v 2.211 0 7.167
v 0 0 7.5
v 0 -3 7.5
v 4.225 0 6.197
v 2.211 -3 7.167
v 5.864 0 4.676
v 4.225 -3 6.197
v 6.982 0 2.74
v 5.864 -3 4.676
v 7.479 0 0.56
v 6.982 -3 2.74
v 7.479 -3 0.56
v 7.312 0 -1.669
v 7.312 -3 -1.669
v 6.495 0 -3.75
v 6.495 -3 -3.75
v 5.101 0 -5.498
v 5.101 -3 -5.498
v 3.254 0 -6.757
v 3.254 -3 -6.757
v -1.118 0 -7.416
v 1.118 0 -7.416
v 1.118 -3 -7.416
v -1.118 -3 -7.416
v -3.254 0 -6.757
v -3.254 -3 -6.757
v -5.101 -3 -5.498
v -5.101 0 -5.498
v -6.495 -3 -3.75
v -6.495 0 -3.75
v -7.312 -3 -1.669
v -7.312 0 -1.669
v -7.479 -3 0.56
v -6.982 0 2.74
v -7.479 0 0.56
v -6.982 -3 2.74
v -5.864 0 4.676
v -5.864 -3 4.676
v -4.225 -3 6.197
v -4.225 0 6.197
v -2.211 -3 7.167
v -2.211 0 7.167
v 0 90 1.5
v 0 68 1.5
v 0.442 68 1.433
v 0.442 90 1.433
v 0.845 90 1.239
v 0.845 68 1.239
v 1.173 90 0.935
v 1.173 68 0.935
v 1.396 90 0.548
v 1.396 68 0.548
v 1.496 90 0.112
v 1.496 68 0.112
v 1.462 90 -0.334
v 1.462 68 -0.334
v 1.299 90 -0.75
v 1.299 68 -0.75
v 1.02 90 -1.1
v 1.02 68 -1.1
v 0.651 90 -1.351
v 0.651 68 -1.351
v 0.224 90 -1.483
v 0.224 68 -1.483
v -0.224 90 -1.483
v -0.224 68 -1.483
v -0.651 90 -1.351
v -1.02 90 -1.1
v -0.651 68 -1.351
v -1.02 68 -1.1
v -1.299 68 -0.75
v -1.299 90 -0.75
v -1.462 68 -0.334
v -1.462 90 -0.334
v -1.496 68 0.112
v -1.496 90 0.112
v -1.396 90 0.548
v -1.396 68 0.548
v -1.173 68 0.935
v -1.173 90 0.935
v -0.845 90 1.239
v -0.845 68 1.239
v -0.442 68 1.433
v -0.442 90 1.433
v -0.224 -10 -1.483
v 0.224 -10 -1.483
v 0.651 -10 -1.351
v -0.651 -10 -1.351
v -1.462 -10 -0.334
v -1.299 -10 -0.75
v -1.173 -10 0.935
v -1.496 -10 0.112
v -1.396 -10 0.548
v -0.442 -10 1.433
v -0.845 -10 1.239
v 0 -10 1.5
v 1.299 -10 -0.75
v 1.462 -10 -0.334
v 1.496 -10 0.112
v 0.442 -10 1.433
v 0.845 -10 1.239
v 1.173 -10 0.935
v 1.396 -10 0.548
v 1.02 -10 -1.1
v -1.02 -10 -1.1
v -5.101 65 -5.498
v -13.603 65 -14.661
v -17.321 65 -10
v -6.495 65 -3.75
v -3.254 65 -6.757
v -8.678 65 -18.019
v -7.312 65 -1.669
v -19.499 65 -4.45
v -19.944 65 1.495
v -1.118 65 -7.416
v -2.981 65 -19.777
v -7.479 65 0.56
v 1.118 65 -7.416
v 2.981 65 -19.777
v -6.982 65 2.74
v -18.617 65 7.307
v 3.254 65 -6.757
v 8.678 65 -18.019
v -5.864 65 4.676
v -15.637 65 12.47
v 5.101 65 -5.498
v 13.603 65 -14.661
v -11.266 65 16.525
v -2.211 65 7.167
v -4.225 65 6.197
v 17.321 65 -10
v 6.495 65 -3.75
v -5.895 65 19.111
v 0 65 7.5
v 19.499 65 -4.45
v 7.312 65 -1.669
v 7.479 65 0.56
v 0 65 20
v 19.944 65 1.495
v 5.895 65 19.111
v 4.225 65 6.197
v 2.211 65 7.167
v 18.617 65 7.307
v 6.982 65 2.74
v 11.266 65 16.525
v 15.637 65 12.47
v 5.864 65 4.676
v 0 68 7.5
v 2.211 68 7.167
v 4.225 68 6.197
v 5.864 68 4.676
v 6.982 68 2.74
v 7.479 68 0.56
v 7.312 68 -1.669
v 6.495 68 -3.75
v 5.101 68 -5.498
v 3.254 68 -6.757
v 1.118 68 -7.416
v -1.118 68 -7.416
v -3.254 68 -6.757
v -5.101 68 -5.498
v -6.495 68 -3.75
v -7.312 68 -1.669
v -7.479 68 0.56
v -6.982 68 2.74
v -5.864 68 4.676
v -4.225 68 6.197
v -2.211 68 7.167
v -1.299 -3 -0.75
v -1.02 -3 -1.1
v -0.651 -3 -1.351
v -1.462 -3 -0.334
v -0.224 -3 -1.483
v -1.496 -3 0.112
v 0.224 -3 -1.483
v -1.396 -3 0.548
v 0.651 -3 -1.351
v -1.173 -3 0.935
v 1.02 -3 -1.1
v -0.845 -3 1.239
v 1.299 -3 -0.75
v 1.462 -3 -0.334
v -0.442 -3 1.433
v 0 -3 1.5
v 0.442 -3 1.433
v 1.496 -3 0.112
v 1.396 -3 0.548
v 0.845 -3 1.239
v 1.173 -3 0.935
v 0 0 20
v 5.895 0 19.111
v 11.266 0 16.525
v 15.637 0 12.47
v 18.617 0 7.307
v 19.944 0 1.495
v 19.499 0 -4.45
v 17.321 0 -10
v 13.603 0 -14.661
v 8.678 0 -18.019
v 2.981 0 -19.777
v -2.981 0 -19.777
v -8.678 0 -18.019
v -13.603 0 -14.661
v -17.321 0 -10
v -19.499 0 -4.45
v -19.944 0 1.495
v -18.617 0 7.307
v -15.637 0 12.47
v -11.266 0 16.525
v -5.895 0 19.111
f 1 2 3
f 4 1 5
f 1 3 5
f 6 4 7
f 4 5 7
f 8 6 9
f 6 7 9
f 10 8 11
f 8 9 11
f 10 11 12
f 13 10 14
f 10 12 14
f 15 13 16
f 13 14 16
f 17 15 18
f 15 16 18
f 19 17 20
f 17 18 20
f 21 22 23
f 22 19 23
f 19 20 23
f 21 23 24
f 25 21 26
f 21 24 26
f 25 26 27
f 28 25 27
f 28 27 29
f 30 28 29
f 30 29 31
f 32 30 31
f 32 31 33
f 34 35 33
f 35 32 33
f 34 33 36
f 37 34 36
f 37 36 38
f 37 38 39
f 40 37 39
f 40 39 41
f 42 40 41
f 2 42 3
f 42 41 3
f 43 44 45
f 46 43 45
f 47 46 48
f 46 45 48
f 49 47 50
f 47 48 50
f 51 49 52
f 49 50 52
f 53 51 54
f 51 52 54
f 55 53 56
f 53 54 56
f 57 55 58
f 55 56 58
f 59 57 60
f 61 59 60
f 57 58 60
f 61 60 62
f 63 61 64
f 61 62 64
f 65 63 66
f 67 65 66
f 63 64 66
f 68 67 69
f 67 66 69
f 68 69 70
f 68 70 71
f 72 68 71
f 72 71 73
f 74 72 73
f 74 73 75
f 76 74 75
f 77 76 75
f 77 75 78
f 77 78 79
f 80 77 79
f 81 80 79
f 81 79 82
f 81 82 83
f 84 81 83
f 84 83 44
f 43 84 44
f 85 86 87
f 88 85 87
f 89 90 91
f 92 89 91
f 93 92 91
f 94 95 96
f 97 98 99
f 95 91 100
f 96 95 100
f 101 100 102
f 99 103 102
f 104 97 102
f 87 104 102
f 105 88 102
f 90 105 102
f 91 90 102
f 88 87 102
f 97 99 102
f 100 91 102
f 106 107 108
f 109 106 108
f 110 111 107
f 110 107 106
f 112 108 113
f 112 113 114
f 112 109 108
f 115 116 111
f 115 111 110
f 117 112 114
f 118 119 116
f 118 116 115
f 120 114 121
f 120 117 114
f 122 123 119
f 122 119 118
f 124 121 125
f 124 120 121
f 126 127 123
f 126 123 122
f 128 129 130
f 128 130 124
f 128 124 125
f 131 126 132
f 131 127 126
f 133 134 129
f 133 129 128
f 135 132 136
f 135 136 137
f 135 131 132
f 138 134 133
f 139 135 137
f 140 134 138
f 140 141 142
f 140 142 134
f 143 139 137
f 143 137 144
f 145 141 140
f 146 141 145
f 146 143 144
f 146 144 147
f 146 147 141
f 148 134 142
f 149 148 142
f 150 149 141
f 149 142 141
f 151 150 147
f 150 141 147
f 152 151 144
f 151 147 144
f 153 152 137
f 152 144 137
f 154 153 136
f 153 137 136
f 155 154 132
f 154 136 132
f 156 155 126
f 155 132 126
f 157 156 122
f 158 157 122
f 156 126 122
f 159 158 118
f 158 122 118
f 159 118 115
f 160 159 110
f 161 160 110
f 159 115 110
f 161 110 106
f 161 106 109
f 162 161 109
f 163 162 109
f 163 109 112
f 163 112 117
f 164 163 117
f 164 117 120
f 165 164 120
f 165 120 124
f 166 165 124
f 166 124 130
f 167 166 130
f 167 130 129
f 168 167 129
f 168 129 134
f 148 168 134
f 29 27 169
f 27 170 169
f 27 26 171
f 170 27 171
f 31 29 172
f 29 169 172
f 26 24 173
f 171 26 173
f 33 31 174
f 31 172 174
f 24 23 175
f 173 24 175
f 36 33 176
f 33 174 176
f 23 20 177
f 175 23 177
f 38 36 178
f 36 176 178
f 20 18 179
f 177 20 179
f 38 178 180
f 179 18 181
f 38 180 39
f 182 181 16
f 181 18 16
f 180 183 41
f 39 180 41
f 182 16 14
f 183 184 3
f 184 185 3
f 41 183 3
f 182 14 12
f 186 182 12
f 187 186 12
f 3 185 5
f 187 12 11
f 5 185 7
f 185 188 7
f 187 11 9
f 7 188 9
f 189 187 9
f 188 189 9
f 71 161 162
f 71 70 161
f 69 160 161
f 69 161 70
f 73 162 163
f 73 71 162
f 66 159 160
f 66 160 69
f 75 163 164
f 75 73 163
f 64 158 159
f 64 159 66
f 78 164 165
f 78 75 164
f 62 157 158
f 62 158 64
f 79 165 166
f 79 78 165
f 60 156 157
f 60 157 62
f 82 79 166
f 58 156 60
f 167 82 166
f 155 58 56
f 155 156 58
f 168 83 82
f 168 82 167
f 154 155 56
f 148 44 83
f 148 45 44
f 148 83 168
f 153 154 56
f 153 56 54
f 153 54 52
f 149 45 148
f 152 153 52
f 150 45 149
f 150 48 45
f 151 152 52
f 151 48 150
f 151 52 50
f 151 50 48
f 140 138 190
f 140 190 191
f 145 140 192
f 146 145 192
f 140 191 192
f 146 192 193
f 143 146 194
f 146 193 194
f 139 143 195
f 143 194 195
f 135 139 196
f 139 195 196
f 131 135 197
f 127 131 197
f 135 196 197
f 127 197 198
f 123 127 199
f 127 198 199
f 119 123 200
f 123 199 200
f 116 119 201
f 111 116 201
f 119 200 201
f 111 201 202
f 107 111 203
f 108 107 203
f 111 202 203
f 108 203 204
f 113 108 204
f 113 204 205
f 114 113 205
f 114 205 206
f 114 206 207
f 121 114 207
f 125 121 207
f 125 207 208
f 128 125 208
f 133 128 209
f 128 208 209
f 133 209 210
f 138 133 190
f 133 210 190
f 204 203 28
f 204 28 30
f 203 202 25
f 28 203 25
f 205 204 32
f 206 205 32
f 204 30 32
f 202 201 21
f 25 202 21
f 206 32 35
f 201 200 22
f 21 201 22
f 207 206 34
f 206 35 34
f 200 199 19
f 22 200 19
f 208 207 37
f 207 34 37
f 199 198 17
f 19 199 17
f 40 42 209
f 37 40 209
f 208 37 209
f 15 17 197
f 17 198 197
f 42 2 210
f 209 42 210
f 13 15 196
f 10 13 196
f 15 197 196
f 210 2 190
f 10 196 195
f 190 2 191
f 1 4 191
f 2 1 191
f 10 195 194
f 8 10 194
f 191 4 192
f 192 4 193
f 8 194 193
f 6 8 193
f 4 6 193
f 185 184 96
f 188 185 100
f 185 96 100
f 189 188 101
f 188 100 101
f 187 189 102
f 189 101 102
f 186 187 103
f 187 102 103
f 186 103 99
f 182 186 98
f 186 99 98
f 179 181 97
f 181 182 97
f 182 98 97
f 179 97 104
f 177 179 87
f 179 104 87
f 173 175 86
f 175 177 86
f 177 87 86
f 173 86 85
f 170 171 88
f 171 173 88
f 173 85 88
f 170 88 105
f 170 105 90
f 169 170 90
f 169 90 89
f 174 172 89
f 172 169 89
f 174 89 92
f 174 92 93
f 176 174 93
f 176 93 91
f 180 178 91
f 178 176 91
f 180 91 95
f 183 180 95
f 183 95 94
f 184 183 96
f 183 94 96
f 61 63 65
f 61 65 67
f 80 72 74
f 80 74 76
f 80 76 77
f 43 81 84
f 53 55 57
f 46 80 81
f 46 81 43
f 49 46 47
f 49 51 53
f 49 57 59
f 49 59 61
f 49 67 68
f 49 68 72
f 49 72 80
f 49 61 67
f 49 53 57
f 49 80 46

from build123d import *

# Parameters (mm, degrees)
SKETCH1_R                = 20
BOSS_EXTRUDE1_DEPTH      = 65
BOSS_EXTRUDE2_DEPTH      = 3
BOSS_EXTRUDE2_DEPTH_BACK = 68
SKETCH2_R                = 7.5
BOSS_EXTRUDE3_DEPTH      = 90
BOSS_EXTRUDE3_DEPTH_BACK = 10
SKETCH3_R                = 1.5


with BuildPart() as part:
    # Sketch1 → Boss-Extrude1 (new body)
    with BuildSketch(Plane(origin=(0, 0, 0), x_dir=(1, 0, 0), z_dir=(0, 1, 0))):
        with Locations(Location((0, 0, 0), (0, 0, 270))):
            Circle(SKETCH1_R)
    extrude(amount=BOSS_EXTRUDE1_DEPTH)

    # Sketch2 → Boss-Extrude2 (add, two sides: drawn at the far end of the back side and taken through both)
    with BuildSketch(Plane(origin=(0, 65, 0), x_dir=(1, 0, 0), z_dir=(0, 1, 0)).offset(-BOSS_EXTRUDE2_DEPTH_BACK)):
        with Locations(Location((0, 0, 0), (0, 0, 270))):
            Circle(SKETCH2_R)
    extrude(amount=BOSS_EXTRUDE2_DEPTH + BOSS_EXTRUDE2_DEPTH_BACK)

    # Sketch3 → Boss-Extrude3 (add, two sides: drawn at the far end of the back side and taken through both)
    with BuildSketch(Plane(origin=(0, 0, 0), x_dir=(1, 0, 0), z_dir=(0, 1, 0)).offset(-BOSS_EXTRUDE3_DEPTH_BACK)):
        with Locations(Location((0, 0, 0), (0, 0, 270))):
            Circle(SKETCH3_R)
    extrude(amount=BOSS_EXTRUDE3_DEPTH + BOSS_EXTRUDE3_DEPTH_BACK)


solid = part.part
